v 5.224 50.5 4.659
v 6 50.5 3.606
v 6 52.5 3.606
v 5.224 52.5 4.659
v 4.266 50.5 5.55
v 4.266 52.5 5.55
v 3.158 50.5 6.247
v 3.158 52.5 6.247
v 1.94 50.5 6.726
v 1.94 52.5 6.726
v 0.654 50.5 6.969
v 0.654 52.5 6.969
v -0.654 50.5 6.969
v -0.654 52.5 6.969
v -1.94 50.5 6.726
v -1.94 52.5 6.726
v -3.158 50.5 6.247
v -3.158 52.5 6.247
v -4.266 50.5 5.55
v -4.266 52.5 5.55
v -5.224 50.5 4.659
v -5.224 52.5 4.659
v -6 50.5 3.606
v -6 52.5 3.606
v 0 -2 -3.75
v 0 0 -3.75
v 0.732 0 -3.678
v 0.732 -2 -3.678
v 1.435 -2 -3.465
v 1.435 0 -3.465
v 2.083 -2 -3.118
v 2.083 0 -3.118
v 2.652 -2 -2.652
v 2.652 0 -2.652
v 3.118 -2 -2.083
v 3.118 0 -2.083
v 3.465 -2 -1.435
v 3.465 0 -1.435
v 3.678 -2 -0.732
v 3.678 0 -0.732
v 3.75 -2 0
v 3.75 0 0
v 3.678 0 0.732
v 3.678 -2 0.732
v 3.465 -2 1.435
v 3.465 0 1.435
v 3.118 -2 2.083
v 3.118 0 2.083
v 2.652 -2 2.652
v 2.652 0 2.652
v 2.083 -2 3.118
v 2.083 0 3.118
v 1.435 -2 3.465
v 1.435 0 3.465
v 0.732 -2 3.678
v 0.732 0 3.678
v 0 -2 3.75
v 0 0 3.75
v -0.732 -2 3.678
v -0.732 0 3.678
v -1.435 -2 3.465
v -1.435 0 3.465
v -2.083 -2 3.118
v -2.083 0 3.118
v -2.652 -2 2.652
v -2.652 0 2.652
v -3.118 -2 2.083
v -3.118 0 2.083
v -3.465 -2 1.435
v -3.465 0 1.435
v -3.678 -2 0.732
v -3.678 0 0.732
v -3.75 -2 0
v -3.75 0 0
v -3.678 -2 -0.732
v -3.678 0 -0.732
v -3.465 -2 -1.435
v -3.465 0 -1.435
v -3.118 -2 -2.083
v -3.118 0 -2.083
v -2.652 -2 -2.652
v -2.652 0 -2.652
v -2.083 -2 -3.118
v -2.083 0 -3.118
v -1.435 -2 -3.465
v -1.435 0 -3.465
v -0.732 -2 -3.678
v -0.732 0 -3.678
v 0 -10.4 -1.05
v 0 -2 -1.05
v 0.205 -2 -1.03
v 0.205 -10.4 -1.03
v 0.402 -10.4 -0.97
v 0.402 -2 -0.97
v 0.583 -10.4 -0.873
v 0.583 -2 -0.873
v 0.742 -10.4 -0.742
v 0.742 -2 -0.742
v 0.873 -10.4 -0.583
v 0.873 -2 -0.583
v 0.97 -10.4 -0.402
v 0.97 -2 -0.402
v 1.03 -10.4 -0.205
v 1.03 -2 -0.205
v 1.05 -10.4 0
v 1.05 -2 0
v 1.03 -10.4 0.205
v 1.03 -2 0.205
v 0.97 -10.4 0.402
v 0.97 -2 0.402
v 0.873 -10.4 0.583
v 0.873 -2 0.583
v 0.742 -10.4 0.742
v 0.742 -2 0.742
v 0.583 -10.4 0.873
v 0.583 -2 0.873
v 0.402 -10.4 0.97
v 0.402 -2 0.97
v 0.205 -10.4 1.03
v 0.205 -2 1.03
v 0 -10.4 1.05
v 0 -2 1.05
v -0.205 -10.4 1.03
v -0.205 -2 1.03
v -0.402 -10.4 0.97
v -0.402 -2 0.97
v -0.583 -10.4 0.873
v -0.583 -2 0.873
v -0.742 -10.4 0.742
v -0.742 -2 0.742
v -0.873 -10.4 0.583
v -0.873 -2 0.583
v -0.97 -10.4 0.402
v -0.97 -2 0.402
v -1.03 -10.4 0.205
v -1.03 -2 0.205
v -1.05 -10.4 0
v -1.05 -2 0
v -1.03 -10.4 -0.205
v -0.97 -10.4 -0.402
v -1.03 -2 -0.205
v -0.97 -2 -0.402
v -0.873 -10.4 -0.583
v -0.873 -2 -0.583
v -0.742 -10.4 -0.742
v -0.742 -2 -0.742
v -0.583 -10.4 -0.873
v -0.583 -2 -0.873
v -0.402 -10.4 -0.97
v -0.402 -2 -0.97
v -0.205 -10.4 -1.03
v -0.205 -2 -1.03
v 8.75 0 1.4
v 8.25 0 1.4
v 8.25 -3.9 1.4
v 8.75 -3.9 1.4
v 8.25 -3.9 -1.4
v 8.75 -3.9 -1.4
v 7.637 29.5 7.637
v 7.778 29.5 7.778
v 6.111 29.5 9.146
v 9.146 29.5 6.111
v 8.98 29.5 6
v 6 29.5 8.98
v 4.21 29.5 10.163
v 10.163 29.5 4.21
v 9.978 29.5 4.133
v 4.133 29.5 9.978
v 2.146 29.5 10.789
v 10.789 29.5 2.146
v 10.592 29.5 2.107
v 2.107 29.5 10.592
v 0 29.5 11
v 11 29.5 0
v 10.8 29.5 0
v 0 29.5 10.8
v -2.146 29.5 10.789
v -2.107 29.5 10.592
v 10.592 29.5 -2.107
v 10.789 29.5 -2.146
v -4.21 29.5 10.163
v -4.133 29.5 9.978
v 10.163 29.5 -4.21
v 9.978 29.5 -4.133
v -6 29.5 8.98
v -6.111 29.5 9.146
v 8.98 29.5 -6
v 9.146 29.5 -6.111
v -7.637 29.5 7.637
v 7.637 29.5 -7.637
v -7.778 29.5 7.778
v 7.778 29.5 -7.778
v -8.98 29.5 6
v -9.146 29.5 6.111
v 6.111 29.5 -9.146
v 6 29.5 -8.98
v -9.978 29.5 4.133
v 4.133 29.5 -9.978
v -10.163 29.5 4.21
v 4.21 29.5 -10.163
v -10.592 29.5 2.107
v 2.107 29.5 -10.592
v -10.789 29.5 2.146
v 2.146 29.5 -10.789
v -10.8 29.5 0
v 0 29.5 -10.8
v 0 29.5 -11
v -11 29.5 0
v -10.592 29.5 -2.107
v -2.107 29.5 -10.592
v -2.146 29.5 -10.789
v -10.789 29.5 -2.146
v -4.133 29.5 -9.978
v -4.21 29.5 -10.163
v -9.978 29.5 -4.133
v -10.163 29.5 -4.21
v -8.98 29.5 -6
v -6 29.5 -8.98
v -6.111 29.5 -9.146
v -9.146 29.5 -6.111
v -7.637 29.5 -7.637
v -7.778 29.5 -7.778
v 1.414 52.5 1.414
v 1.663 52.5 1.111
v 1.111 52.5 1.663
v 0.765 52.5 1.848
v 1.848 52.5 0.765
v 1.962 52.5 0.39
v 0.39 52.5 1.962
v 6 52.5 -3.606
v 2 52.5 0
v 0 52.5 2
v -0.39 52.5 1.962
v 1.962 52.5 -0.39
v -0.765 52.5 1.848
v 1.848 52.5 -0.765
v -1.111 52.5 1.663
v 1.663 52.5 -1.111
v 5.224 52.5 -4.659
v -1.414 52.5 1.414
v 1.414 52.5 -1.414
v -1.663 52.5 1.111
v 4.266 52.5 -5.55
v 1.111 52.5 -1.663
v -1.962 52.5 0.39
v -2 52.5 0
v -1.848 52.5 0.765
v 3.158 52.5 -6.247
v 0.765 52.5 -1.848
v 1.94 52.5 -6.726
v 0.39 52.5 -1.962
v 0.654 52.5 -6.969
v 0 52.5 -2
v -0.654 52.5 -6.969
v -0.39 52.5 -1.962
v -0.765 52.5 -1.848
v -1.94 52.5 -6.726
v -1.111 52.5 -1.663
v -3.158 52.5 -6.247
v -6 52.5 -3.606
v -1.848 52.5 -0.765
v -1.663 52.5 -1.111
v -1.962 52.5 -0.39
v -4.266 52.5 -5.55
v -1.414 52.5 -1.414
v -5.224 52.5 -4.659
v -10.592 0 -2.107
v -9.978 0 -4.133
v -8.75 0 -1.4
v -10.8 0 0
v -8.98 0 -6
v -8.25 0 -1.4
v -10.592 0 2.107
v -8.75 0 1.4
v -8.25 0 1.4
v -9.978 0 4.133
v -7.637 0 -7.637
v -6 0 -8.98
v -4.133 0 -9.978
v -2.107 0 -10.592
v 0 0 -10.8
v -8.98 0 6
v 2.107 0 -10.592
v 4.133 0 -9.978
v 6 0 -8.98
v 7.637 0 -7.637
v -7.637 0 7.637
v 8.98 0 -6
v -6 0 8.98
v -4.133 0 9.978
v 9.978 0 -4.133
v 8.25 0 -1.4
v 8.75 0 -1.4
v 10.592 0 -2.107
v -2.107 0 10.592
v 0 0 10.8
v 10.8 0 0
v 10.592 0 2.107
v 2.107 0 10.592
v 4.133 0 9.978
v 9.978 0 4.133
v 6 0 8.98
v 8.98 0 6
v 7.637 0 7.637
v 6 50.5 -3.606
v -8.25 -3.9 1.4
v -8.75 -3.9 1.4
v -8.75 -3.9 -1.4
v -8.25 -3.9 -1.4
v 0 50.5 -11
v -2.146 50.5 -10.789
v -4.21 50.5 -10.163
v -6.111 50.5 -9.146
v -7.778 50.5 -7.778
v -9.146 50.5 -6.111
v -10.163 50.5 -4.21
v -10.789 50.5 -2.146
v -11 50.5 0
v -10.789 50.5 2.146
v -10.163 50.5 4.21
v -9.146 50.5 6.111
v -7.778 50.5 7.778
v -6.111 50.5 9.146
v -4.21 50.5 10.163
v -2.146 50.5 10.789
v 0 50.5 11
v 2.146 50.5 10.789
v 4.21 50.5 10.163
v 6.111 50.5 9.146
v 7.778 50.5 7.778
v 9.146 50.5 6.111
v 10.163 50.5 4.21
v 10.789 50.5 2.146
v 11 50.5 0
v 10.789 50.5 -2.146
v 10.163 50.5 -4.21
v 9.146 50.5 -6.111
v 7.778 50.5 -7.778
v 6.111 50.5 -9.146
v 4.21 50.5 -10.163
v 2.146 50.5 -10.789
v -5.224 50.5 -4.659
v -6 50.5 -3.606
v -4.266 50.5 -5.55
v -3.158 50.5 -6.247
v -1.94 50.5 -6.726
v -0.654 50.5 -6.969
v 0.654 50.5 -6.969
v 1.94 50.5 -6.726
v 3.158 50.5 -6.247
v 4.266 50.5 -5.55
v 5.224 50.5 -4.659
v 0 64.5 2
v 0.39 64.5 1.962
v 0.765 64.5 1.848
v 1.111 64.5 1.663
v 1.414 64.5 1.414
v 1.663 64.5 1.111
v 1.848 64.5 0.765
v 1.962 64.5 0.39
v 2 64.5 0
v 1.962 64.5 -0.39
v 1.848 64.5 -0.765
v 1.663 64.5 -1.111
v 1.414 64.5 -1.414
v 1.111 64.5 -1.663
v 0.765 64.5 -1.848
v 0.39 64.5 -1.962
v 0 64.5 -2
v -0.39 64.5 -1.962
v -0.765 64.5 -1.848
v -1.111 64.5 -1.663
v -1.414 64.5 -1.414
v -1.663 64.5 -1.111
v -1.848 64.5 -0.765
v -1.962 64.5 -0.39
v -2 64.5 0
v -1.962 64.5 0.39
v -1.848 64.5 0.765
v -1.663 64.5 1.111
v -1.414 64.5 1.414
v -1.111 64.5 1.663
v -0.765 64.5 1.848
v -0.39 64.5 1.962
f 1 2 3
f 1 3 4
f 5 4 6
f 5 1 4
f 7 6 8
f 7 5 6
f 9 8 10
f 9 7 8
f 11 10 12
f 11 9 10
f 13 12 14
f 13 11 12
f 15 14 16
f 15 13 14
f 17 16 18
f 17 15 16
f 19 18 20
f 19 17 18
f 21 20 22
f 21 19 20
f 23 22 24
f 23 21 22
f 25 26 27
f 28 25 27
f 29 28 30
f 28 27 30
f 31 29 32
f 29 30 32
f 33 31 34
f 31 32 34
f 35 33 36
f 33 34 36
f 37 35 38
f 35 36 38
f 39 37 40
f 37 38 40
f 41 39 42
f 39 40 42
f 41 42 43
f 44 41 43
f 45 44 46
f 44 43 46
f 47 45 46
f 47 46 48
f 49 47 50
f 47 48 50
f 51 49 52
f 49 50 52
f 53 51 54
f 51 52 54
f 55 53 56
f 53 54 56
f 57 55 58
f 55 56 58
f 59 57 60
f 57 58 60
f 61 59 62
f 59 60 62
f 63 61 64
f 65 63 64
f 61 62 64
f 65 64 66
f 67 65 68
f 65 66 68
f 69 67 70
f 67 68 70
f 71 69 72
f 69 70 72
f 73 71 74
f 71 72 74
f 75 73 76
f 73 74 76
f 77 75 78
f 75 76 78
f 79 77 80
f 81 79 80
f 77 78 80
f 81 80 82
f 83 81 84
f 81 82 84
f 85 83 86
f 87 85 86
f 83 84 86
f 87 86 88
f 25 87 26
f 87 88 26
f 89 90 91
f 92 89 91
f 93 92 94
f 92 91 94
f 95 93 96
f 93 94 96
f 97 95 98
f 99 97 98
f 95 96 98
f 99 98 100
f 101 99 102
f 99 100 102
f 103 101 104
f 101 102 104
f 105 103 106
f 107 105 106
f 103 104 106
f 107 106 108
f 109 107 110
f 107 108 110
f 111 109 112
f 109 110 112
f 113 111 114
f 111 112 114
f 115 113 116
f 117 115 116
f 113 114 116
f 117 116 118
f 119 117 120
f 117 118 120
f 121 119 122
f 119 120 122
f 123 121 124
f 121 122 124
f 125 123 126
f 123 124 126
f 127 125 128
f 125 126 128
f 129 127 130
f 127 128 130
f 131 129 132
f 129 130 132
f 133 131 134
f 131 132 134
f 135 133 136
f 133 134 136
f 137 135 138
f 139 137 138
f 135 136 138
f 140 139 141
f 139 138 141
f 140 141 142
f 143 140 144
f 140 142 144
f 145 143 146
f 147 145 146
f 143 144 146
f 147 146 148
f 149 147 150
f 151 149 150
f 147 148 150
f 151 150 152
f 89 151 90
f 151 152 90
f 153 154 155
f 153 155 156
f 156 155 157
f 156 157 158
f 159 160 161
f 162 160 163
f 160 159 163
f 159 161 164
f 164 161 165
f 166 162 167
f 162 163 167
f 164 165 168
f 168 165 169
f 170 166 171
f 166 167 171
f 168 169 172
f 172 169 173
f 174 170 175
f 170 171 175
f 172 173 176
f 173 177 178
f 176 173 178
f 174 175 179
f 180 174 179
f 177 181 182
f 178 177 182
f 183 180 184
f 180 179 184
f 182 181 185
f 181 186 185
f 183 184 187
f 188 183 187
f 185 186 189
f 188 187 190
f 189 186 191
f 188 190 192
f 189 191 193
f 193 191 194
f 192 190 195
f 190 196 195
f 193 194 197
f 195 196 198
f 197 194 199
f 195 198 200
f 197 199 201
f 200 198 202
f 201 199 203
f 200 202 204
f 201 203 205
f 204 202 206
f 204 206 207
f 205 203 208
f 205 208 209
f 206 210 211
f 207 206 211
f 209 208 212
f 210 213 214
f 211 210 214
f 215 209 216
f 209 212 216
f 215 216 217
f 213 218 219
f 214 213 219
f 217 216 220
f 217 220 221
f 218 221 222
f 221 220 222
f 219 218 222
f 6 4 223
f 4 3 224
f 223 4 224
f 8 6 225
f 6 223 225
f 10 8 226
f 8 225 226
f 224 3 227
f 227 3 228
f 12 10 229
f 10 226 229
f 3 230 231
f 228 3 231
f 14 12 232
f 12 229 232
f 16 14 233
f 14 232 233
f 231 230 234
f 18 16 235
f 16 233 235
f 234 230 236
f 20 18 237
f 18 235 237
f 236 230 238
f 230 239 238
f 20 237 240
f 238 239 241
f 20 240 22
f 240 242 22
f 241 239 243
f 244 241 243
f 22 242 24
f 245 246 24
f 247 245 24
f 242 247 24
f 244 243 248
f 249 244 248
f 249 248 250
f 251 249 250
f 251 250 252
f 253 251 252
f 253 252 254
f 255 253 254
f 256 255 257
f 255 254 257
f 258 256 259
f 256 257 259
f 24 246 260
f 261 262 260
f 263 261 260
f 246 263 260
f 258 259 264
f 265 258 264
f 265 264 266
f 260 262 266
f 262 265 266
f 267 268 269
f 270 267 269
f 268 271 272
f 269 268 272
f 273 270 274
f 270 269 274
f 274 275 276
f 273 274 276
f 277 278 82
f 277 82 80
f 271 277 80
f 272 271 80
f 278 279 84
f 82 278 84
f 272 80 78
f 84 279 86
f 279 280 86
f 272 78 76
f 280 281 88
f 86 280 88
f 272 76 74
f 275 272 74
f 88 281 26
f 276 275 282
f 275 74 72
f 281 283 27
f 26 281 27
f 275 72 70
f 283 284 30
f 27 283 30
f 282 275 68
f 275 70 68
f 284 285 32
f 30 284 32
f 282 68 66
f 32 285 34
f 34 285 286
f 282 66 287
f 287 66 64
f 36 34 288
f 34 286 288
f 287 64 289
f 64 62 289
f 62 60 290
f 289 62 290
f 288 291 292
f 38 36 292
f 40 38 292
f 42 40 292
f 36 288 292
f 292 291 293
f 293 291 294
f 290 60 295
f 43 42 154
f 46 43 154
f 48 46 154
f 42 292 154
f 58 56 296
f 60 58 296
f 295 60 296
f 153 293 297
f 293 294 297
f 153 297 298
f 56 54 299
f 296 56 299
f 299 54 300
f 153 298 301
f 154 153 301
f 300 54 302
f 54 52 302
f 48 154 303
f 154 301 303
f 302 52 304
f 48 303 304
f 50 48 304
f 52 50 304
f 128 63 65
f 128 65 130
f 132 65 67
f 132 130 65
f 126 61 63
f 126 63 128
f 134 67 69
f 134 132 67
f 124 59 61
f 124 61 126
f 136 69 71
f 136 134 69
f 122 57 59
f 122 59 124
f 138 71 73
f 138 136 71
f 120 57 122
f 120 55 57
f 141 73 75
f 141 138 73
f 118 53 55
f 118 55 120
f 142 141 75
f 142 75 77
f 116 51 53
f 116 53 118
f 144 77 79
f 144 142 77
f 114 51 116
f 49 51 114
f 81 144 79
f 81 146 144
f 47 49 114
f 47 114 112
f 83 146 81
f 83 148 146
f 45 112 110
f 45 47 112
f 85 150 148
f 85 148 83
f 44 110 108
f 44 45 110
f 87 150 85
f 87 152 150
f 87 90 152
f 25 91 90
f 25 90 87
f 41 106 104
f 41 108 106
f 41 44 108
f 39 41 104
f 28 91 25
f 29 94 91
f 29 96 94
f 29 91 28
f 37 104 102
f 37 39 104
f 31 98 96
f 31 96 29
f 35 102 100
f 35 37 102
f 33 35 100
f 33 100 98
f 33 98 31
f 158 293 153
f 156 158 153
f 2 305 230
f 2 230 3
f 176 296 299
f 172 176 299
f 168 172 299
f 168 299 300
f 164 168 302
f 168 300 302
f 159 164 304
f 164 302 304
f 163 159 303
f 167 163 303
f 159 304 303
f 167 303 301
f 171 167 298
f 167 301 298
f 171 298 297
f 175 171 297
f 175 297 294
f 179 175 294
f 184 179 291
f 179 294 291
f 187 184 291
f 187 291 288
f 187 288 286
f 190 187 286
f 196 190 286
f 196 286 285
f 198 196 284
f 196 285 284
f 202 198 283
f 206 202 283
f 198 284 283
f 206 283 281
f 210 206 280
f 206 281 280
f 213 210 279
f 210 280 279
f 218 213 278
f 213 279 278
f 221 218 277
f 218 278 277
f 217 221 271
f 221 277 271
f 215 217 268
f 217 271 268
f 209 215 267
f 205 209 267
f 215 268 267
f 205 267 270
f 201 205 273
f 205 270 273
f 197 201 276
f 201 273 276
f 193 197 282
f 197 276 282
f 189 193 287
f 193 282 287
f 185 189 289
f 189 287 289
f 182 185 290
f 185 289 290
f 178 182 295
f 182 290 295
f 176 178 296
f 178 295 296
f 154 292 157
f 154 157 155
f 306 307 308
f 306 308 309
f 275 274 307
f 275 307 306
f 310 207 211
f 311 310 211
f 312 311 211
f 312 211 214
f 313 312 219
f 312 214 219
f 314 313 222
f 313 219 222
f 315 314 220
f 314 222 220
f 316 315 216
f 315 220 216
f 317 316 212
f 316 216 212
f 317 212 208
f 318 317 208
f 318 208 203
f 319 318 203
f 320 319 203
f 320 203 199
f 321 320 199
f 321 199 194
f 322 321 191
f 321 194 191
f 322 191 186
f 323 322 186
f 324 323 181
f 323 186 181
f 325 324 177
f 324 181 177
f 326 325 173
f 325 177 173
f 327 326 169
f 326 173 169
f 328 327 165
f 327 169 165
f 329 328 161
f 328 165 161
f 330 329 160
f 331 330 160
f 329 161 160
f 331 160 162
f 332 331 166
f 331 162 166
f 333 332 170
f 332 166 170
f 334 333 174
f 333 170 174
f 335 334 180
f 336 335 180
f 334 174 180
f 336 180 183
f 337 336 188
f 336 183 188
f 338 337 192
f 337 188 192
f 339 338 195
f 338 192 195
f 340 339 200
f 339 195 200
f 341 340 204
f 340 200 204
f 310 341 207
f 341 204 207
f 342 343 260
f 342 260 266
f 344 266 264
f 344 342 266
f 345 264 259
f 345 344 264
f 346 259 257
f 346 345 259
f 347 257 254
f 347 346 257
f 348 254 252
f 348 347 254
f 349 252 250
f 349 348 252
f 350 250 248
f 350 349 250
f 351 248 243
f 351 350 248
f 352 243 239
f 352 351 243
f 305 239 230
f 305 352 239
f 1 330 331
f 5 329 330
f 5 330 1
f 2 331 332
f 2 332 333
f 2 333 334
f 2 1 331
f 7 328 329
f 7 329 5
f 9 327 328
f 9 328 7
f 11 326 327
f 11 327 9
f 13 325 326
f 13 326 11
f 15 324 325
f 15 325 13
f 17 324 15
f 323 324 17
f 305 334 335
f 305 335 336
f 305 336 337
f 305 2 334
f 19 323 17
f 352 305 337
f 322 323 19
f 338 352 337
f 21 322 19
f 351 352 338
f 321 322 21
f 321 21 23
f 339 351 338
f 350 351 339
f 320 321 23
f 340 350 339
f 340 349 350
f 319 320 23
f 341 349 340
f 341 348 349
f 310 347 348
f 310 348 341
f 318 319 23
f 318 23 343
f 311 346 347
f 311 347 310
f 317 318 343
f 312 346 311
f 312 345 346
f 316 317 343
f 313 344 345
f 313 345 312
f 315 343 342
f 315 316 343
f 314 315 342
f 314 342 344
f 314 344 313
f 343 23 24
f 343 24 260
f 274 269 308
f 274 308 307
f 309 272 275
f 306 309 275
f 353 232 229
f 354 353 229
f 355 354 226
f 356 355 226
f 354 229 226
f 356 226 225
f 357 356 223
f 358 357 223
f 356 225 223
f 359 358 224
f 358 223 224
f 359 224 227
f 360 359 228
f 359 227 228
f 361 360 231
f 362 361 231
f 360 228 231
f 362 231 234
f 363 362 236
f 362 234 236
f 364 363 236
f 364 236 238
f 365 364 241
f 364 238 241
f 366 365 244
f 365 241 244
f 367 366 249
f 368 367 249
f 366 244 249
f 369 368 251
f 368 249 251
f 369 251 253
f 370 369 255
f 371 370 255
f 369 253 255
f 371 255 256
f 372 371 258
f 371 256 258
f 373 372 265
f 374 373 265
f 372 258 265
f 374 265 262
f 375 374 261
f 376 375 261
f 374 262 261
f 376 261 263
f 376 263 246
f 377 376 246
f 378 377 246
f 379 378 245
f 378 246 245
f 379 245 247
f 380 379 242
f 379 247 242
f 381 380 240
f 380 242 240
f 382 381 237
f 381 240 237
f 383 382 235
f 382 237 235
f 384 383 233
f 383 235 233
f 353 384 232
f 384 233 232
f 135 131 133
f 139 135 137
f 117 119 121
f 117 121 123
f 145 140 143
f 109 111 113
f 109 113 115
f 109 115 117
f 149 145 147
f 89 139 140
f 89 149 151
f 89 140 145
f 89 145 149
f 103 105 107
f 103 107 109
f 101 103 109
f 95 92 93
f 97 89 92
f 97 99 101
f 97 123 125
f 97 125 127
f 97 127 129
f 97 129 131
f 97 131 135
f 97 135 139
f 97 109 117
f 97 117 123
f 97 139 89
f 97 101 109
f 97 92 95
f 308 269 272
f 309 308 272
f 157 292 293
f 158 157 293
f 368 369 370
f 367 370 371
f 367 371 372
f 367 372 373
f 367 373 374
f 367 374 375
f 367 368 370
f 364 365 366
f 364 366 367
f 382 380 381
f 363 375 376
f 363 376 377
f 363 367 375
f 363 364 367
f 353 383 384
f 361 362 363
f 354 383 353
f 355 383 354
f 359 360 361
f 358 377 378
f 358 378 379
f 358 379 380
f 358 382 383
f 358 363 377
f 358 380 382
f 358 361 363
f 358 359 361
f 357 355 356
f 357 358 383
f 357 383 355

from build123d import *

# Parameters (mm, degrees)
SKETCH2_R           = 10.8
BOSS_EXTRUDE1_DEPTH = 29.5
SKETCH3_R           = 11
BOSS_EXTRUDE2_DEPTH = 21
BOSS_EXTRUDE3_DEPTH = 2
SKETCH5_R           = 2
BOSS_EXTRUDE4_DEPTH = 12
SKETCH6_R           = 3.75
BOSS_EXTRUDE5_DEPTH = 2
SKETCH7_W           = 0.5
SKETCH7_H           = 2.8
BOSS_EXTRUDE6_DEPTH = 3.9
SKETCH8_R           = 1.05
BOSS_EXTRUDE7_DEPTH = 8.4


with BuildPart() as part:
    # Sketch2 → Boss-Extrude1 (new body)
    with BuildSketch(Plane(origin=(0, 0, 0), x_dir=(1, 0, 0), z_dir=(0, 1, 0))):
        with Locations(Location((0, 0, 0), (0, 0, 270))):
            Circle(SKETCH2_R)
    extrude(amount=BOSS_EXTRUDE1_DEPTH)

    # Sketch3 → Boss-Extrude2 (add)
    with BuildSketch(Plane(origin=(0, 29.5, 0), x_dir=(1, 0, 0), z_dir=(0, 1, 0))):
        with Locations(Location((0, 0, 0), (0, 0, 90))):
            Circle(SKETCH3_R)
    extrude(amount=BOSS_EXTRUDE2_DEPTH)

    # Sketch4 → Boss-Extrude3 (add)
    with BuildSketch(Plane(origin=(0, 50.5, 0), x_dir=(1, 0, 0), z_dir=(0, 1, 0))):
        with BuildLine():
            Line((6, 3.605551275), (6, -3.605551275))
            ThreePointArc((6, -3.605551275), (0, -7), (-6, -3.605551275))
            Line((-6, -3.605551275), (-6, 3.605551275))
            ThreePointArc((-6, 3.605551275), (0, 7), (6, 3.605551275))
        make_face()
    extrude(amount=BOSS_EXTRUDE3_DEPTH)

    # Sketch5 → Boss-Extrude4 (add)
    with BuildSketch(Plane(origin=(0, 52.5, 0), x_dir=(1, 0, 0), z_dir=(0, 1, 0))):
        with Locations(Location((0, 0, 0), (0, 0, 270))):
            Circle(SKETCH5_R)
    extrude(amount=BOSS_EXTRUDE4_DEPTH)

    # Sketch6 → Boss-Extrude5 (add)
    with BuildSketch(Plane.XZ):
        with Locations(Location((0, 0, 0), (0, 0, 270))):
            Circle(SKETCH6_R)
    extrude(amount=BOSS_EXTRUDE5_DEPTH)

    # Sketch7 → Boss-Extrude6 (add)
    with BuildSketch(Plane.XZ):
        with Locations((-8.5, 0)):
            Rectangle(SKETCH7_W, SKETCH7_H)
        with Locations((8.5, 0)):
            Rectangle(SKETCH7_W, SKETCH7_H)
    extrude(amount=BOSS_EXTRUDE6_DEPTH)

    # Sketch8 → Boss-Extrude7 (add)
    with BuildSketch(Plane.XZ.offset(2)):
        with Locations(Location((0, 0, 0), (0, 0, 270))):
            Circle(SKETCH8_R)
    extrude(amount=BOSS_EXTRUDE7_DEPTH)


solid = part.part
